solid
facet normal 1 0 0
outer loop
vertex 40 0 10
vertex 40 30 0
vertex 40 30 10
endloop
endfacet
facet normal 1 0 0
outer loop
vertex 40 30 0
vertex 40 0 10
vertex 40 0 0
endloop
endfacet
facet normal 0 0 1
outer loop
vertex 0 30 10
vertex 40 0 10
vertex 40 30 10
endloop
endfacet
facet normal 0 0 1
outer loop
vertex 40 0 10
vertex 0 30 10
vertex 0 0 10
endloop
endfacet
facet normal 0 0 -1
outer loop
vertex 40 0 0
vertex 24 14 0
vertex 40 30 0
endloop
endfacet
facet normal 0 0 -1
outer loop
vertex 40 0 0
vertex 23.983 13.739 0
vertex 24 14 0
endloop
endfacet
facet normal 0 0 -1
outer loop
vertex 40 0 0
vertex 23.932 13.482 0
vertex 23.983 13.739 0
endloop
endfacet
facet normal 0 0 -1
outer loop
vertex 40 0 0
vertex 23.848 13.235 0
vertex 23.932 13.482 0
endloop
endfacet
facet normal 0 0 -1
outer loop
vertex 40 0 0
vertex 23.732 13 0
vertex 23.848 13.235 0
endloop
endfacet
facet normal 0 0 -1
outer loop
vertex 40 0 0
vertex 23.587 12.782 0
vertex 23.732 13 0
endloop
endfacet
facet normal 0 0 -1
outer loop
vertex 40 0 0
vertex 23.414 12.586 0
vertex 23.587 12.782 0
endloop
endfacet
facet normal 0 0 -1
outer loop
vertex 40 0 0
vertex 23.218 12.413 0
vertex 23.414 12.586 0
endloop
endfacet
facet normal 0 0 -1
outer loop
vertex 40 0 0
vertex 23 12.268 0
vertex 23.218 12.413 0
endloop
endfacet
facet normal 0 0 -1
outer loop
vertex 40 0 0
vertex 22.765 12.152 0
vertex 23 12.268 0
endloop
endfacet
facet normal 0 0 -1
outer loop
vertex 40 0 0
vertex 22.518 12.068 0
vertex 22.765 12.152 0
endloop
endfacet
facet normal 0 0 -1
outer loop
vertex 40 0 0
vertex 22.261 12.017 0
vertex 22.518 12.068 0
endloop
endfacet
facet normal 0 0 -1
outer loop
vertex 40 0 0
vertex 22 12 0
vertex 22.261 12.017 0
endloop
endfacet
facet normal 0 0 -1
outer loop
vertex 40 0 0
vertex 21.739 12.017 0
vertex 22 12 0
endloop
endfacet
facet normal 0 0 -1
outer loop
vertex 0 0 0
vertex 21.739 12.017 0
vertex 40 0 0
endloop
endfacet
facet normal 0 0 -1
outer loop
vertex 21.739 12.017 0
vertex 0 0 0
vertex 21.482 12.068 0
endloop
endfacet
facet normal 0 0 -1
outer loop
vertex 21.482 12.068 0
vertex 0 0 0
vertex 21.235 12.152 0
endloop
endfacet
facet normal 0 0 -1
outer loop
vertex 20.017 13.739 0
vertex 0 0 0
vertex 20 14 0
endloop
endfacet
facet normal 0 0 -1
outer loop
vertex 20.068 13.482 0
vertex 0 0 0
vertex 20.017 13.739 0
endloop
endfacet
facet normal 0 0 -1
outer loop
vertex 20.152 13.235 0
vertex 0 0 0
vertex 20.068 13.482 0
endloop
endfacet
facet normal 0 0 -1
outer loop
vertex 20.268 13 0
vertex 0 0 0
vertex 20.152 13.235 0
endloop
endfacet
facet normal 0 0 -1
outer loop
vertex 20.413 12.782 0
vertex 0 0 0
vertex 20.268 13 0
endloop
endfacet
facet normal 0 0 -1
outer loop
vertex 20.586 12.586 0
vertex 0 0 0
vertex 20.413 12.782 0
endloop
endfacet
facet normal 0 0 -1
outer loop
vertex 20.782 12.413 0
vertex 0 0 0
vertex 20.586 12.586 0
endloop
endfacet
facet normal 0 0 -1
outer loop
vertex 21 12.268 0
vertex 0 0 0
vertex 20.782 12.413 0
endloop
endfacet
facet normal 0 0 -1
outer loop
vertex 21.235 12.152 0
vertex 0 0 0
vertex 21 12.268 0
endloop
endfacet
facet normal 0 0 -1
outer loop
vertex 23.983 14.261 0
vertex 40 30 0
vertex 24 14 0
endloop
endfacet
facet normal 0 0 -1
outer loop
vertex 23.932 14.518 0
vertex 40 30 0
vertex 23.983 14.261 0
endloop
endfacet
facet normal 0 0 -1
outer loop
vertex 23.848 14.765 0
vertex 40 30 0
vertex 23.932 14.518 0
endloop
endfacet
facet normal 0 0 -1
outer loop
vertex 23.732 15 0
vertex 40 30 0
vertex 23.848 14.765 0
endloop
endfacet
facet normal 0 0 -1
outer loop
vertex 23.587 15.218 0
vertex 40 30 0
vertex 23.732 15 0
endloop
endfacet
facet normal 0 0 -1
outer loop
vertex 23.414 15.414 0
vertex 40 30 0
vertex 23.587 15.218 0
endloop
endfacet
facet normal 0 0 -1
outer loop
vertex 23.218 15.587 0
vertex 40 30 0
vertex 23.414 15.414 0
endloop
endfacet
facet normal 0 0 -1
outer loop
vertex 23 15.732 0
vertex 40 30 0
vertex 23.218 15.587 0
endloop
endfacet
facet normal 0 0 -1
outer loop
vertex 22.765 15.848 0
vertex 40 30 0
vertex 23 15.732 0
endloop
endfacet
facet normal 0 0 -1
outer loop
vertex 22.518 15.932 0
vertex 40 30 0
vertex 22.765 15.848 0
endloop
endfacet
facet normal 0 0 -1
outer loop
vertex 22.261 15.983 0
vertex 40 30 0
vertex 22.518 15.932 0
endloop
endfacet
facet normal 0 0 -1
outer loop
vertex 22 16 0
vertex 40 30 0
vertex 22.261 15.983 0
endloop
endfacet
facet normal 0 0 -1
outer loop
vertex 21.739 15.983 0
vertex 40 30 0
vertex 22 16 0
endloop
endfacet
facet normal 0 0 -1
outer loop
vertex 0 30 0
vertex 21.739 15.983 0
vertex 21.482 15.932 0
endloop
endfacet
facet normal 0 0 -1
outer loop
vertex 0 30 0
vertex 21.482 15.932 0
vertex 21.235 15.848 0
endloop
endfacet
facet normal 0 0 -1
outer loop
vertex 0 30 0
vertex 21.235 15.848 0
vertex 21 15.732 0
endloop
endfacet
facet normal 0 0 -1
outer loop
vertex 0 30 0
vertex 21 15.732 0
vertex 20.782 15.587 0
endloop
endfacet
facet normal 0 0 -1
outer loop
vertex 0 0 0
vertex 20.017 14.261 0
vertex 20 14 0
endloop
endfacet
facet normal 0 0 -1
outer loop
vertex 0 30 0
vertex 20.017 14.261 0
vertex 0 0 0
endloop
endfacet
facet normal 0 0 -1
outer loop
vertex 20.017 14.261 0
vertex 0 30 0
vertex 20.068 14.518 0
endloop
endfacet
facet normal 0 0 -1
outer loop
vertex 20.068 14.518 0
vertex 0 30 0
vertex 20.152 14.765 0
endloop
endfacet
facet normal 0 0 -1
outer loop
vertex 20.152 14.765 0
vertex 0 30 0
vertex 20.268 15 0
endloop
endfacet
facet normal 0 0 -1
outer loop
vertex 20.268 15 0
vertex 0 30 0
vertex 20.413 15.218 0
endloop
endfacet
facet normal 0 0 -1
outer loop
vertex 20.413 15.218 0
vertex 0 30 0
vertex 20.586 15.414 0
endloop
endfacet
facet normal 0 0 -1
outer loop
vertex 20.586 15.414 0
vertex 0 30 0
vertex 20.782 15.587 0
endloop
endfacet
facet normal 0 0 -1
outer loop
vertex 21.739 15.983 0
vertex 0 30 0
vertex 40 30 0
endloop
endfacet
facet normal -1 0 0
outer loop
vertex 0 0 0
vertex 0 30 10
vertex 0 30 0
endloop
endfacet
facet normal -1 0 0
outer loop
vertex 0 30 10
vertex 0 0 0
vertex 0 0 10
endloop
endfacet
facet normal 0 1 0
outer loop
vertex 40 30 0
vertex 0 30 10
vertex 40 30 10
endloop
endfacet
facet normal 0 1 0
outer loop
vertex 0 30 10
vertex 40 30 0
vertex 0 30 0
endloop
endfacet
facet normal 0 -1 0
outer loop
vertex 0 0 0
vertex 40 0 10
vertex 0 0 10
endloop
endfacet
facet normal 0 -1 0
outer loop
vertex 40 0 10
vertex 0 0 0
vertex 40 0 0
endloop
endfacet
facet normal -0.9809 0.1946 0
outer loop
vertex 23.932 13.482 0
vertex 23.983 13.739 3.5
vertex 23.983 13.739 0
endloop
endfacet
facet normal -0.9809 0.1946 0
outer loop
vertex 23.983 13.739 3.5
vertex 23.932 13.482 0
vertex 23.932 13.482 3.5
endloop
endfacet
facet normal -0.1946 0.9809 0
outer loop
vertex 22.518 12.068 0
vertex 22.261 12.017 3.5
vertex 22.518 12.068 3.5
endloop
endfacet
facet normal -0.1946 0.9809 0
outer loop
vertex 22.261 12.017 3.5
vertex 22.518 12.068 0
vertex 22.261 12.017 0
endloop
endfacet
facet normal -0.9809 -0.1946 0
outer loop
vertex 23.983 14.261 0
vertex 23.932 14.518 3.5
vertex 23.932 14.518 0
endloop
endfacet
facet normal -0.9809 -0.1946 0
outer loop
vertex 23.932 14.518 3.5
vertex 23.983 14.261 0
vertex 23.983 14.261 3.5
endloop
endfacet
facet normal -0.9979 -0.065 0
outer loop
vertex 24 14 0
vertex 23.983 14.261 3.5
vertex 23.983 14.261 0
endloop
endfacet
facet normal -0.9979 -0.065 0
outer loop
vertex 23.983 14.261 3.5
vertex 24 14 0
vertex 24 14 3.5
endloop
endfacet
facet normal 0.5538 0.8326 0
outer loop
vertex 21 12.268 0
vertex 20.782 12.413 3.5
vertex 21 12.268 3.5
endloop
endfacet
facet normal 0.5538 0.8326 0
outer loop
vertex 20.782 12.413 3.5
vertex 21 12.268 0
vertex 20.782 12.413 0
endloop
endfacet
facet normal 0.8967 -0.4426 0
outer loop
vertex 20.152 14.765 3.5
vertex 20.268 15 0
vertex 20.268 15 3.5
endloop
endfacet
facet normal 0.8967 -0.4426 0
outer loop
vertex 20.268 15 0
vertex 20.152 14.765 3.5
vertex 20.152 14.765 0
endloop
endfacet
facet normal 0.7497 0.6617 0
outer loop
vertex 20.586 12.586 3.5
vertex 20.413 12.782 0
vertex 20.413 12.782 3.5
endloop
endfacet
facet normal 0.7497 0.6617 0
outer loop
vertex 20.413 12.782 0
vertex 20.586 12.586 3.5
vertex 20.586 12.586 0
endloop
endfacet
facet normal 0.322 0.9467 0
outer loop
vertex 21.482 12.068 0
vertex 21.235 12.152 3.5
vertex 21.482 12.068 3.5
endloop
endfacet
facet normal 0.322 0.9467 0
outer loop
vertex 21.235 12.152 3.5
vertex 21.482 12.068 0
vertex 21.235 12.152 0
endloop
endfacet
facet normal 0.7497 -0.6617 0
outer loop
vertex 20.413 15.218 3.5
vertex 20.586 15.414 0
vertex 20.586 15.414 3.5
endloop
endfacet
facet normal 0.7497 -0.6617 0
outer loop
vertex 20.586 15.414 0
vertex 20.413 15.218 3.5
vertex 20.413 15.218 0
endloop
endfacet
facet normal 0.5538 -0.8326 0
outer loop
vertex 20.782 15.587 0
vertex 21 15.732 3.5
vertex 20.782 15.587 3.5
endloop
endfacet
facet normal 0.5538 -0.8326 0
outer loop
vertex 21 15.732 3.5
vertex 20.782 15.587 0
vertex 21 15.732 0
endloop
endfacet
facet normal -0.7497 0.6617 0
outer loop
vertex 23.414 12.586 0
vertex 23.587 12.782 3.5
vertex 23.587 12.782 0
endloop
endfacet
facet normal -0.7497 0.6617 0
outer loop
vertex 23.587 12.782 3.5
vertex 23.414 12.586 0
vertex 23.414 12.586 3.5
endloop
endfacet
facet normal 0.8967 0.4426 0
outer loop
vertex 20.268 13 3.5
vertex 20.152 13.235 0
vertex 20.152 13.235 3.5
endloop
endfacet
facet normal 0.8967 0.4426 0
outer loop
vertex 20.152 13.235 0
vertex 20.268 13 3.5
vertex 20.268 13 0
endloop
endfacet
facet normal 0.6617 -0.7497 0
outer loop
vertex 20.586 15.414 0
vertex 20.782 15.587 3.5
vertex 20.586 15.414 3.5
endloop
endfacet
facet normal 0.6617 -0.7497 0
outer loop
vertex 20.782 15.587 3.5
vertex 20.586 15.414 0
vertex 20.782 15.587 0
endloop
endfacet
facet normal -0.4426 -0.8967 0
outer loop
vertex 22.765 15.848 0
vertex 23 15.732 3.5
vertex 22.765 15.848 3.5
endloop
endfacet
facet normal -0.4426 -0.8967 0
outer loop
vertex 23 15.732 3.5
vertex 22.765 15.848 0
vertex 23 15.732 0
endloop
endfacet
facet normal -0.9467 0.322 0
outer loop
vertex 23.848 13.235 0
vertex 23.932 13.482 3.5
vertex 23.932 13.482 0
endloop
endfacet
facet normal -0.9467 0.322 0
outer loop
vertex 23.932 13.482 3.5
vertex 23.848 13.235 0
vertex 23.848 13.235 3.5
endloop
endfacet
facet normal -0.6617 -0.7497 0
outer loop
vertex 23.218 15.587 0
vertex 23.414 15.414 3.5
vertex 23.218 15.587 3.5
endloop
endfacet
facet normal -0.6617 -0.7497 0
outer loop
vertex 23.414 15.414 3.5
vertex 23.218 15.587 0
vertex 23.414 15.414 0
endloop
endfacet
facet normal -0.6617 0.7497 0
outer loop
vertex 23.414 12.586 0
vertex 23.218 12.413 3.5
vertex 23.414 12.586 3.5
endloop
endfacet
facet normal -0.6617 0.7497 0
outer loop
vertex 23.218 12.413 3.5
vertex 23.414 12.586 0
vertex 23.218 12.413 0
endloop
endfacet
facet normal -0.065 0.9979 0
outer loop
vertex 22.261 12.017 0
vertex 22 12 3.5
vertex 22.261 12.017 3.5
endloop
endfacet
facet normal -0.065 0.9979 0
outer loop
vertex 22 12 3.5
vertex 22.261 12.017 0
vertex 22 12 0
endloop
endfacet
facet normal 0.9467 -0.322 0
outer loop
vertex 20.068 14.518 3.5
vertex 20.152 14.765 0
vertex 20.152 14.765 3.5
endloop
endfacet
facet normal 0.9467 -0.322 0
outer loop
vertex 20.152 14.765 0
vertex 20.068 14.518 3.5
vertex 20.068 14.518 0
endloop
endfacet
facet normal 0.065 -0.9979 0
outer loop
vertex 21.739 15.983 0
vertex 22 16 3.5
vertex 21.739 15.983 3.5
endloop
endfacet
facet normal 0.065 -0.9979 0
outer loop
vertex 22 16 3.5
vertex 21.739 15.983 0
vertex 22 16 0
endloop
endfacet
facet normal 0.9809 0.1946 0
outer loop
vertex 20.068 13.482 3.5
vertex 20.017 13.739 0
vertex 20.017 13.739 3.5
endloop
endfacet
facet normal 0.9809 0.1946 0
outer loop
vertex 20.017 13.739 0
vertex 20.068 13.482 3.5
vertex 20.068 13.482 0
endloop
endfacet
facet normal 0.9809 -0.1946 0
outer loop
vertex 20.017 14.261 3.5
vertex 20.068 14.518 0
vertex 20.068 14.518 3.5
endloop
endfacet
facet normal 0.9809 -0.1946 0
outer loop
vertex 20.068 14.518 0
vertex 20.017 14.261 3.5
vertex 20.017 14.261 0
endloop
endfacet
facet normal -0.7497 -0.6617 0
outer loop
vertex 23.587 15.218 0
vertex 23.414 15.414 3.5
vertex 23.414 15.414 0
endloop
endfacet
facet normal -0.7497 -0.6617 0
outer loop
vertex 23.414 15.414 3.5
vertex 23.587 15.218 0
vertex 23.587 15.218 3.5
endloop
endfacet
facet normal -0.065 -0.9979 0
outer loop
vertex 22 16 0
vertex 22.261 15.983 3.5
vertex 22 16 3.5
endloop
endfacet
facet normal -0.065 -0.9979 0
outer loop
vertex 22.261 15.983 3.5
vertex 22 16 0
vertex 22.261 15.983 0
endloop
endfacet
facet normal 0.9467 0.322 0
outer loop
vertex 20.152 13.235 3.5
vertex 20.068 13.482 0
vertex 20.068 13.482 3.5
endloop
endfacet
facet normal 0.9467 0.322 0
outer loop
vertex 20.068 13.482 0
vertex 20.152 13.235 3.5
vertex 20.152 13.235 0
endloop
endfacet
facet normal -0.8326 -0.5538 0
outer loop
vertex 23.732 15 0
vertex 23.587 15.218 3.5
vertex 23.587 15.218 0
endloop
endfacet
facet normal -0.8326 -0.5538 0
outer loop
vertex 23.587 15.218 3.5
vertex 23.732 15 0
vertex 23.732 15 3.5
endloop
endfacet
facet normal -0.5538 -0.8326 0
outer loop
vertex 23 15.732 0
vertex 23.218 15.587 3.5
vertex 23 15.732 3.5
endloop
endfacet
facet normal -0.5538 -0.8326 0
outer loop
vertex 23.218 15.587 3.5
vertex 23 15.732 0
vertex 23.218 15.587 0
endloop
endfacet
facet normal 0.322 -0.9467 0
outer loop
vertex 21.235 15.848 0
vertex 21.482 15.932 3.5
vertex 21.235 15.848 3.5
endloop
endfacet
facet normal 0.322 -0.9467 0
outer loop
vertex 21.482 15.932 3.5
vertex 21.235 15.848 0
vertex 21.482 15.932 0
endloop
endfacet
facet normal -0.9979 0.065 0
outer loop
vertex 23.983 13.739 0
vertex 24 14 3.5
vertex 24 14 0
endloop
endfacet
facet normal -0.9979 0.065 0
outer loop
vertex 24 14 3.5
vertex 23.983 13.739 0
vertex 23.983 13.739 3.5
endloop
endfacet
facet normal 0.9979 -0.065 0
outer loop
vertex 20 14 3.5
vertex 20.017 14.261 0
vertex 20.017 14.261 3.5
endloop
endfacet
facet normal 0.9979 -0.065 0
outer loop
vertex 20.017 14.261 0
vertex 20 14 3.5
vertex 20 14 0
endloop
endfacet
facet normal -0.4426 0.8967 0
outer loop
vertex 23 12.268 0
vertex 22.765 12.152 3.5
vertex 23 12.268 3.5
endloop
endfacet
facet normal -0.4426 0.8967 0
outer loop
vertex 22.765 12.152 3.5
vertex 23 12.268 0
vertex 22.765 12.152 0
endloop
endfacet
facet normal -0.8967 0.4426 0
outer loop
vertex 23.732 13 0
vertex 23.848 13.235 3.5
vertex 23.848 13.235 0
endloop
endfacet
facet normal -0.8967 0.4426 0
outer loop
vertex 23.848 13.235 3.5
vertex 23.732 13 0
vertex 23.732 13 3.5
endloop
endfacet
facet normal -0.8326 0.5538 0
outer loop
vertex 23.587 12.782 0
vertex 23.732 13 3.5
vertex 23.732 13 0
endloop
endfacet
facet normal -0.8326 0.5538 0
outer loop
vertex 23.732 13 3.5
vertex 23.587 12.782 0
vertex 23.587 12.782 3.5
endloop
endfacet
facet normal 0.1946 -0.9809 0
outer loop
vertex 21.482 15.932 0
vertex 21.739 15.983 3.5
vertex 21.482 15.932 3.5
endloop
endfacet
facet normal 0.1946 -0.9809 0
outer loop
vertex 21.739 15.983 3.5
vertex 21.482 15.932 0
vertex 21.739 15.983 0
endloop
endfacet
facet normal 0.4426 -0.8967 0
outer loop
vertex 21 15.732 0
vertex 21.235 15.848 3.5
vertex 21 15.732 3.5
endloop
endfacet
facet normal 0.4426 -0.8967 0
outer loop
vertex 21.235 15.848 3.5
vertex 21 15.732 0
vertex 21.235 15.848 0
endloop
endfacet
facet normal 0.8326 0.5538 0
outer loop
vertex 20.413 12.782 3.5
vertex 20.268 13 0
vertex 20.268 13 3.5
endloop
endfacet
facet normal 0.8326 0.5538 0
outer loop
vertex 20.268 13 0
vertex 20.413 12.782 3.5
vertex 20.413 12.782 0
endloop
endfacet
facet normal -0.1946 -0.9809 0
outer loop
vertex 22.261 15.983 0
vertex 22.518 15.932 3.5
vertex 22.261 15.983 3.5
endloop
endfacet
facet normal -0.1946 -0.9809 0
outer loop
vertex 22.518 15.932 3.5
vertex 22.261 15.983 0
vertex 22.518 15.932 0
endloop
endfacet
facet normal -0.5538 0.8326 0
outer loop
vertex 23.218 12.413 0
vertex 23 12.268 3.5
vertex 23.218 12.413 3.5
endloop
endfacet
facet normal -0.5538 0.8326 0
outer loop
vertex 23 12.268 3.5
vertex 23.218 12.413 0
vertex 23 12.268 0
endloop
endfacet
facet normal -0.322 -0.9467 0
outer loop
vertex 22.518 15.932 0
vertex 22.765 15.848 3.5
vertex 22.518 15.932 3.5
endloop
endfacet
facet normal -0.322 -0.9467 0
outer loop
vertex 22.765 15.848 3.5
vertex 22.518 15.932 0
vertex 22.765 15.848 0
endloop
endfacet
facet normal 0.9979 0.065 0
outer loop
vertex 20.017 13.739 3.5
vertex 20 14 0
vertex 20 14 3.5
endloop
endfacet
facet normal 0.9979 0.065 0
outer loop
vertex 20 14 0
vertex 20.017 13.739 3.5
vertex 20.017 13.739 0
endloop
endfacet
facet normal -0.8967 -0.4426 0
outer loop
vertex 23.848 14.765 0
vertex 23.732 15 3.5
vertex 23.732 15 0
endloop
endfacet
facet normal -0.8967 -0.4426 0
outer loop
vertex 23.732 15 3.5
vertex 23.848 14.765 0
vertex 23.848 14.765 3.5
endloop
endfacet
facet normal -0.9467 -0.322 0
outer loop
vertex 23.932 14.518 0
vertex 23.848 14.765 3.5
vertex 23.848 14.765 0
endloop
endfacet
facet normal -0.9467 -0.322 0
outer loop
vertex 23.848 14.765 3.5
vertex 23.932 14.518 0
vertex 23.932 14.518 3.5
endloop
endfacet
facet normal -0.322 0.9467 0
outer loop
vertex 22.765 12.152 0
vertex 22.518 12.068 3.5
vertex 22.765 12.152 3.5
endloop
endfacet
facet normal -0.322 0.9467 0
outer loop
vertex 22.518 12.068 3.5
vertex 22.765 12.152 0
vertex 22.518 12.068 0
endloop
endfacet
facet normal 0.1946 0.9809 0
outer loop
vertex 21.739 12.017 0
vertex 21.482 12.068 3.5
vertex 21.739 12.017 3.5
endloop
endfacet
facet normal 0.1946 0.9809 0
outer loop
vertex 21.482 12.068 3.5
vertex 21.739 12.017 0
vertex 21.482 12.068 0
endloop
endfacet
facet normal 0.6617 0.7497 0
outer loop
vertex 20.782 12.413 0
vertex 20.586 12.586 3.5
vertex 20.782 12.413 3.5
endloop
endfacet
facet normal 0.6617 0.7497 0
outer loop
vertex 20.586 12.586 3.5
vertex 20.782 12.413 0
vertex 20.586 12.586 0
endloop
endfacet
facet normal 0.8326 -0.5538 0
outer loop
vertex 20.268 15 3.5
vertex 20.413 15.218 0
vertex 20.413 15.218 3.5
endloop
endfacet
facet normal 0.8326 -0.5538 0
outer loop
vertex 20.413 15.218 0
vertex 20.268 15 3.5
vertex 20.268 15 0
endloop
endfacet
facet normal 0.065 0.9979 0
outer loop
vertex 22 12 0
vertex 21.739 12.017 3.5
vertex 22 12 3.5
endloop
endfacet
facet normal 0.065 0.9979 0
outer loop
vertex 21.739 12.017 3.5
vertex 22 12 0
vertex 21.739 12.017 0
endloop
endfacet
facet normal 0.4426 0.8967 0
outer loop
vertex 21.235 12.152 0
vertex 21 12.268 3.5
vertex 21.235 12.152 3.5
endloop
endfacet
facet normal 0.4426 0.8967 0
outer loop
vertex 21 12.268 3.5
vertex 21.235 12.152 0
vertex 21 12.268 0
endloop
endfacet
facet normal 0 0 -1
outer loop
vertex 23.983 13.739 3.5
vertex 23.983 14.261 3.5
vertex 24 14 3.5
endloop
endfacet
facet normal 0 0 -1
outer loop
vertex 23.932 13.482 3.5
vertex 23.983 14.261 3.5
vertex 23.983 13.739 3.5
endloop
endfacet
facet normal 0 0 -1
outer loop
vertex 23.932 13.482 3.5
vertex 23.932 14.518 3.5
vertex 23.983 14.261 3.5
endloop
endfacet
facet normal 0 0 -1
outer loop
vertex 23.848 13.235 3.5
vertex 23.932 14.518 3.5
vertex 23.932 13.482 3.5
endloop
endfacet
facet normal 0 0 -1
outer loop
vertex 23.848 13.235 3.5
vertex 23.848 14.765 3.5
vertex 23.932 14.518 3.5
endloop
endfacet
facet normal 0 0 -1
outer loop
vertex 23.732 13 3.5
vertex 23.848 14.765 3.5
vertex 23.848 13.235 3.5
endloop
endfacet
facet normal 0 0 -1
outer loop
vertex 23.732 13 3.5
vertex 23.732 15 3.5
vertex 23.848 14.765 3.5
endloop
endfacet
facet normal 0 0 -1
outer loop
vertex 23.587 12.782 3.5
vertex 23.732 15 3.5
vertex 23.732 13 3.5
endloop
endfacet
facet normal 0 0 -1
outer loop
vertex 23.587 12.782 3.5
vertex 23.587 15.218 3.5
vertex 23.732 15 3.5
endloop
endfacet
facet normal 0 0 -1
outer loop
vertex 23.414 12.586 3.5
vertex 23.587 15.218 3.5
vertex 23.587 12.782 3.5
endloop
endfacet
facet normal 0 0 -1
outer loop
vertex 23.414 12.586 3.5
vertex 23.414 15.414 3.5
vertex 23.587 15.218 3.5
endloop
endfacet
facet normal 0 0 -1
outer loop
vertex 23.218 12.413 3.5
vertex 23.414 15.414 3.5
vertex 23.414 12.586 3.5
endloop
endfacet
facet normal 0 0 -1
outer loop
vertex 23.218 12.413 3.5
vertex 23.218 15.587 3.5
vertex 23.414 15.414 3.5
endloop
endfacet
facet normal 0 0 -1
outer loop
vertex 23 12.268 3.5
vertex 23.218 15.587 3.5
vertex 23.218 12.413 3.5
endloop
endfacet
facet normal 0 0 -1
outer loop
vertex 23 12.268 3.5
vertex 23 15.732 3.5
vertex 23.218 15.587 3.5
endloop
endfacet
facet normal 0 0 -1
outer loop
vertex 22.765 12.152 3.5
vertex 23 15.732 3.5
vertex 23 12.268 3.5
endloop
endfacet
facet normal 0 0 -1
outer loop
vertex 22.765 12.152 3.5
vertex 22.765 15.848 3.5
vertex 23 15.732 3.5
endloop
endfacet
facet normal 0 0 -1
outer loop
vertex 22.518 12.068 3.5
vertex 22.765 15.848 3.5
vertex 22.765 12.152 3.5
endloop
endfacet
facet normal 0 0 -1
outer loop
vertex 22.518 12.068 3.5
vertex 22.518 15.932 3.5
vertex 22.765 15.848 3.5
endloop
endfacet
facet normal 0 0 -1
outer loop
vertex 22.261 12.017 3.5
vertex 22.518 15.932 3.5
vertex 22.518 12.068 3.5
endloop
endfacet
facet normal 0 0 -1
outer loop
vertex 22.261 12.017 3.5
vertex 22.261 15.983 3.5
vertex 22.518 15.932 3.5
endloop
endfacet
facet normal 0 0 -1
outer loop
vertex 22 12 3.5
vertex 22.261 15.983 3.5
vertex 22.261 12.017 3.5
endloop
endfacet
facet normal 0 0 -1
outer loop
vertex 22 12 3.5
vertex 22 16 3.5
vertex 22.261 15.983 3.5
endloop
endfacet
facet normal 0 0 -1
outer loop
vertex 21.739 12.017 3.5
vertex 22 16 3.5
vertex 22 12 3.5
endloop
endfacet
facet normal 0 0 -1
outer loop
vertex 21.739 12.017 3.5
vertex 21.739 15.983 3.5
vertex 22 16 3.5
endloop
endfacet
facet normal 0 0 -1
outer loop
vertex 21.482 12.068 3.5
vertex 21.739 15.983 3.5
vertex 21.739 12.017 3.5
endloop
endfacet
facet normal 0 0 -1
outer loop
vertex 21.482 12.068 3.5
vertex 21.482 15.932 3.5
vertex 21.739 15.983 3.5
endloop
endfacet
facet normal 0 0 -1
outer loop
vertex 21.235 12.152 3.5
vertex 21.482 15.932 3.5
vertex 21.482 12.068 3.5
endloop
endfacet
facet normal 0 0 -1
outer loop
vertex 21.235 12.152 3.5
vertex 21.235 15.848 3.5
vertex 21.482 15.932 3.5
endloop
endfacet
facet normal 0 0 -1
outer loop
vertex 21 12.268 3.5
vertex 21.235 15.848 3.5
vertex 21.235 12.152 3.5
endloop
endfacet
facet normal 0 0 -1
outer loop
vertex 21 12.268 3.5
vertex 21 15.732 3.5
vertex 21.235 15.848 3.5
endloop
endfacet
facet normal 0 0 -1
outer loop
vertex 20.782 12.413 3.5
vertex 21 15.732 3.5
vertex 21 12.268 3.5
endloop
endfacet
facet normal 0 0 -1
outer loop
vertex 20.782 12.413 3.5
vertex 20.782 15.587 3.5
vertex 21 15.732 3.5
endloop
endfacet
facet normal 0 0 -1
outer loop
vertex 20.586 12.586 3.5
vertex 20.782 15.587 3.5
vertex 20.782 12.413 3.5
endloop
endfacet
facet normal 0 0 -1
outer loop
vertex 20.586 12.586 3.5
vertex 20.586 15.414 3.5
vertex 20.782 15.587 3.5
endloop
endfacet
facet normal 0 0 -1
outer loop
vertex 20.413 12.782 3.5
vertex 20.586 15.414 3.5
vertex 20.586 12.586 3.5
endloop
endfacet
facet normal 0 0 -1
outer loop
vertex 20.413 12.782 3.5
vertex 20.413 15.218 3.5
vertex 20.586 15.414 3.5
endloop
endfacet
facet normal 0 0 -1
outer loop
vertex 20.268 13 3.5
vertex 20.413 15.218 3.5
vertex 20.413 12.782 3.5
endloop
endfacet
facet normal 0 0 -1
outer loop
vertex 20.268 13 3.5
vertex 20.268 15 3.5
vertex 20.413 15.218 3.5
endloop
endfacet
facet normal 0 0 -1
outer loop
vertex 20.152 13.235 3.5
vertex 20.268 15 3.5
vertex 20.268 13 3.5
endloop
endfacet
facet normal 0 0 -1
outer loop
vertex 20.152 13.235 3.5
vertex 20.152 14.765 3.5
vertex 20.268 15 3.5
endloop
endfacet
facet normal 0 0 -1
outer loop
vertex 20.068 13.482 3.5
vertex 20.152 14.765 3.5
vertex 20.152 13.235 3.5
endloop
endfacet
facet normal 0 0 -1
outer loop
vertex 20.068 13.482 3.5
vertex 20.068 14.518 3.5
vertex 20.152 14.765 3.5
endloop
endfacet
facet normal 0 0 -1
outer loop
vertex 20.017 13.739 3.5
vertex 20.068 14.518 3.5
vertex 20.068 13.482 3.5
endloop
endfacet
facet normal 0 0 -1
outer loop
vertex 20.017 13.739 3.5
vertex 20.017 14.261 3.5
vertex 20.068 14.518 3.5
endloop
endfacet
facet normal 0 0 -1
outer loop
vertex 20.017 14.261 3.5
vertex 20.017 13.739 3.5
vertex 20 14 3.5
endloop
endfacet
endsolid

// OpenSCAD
// units=mm — generated by scad_emitter.py
// part=unnamed
$fn = 48;

difference() { cube([40, 30, 10]); translate([22, 14, -0.5]) rotate([0, 0, 0]) cylinder(h=4, r=2, $fn=$fn); }
